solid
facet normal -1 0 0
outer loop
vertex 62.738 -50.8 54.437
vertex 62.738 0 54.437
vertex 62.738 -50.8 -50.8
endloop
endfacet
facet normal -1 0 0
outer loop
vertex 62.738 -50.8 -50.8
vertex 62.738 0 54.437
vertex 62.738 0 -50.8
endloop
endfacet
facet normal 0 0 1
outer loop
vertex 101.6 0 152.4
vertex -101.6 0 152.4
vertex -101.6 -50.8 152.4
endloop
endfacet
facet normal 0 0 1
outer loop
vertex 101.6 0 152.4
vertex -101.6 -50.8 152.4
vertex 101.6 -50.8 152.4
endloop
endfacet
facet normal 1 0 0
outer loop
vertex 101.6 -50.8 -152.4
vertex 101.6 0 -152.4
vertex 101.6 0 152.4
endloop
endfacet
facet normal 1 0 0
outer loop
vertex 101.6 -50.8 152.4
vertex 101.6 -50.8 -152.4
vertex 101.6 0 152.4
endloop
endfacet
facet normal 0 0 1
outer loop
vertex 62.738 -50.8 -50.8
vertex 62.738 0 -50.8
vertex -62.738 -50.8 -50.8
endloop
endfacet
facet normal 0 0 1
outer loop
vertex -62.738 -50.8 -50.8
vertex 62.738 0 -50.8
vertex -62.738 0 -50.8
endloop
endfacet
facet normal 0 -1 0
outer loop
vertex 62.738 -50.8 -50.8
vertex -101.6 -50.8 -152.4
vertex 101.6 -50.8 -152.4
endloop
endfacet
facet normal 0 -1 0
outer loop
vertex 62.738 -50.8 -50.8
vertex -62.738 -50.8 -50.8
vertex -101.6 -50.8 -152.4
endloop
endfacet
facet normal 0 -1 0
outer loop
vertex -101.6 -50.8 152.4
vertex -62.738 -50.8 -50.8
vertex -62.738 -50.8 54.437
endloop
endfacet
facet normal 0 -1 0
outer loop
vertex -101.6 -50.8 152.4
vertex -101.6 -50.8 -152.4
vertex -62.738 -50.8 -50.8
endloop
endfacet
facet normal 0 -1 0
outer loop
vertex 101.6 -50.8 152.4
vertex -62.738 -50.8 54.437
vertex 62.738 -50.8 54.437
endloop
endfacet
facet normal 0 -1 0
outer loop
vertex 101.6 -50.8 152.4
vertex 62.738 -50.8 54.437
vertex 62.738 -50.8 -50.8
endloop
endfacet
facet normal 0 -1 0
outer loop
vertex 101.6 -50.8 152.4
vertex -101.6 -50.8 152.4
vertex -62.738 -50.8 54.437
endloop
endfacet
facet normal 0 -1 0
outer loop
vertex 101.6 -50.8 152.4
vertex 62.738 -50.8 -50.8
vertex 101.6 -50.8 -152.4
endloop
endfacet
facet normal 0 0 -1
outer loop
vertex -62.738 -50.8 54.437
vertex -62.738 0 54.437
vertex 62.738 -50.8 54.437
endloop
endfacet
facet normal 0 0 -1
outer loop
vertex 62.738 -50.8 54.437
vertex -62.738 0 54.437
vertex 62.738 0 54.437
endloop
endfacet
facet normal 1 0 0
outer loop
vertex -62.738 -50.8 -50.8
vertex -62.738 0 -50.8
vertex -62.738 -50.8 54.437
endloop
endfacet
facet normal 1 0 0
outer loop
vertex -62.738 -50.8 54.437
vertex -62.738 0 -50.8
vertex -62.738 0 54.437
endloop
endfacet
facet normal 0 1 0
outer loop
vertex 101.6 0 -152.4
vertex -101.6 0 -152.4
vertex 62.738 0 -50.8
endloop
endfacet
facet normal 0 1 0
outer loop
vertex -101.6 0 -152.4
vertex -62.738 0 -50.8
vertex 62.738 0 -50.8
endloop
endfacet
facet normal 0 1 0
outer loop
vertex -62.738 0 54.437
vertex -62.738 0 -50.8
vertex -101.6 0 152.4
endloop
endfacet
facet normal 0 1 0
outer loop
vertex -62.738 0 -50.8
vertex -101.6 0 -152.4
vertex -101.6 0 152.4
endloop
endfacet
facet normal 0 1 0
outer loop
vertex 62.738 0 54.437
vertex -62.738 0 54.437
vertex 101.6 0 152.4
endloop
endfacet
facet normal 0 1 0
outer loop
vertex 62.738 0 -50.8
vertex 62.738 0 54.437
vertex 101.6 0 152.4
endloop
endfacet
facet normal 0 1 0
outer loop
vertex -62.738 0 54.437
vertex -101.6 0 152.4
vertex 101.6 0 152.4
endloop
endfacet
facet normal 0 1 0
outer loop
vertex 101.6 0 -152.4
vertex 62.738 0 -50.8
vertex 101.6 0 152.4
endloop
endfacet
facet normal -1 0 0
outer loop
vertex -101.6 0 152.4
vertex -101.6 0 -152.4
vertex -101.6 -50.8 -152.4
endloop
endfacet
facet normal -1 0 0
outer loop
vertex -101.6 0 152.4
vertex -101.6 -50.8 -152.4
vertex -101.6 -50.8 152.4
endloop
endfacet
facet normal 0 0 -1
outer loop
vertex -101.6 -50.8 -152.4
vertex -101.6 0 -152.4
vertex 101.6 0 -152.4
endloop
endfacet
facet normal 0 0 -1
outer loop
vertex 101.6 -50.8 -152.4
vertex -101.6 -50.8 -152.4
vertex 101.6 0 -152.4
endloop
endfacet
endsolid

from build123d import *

# Parameters (mm, degrees)
F0_W     = 203.2
F0_H     = 304.8
F0_W_2   = 125.476
F0_H_2   = 59.863002
F0_W_3   = 77.724
F0_H_3   = 58.935668
F1_DEPTH = 50.8


with BuildPart() as f1:
    # F0 (on Front) → F1 (new body)
    with BuildSketch(Plane.XZ):
        Rectangle(F0_W, F0_H)
        Polygon((-38.862, -109.735668), (-38.862, -50.8), (-62.738, -50.8), (-62.738, 54.436998), (-62.738, 114.3), (62.738, 114.3), (62.738, 54.436998), (62.738, -50.8), (38.862, -50.8), (38.862, -109.735668), align=None, mode=Mode.SUBTRACT)
        with Locations((0, 84.368499)):
            Rectangle(F0_W_2, F0_H_2)
        with Locations((0, -80.267834)):
            Rectangle(F0_W_3, F0_H_3)
    extrude(amount=F1_DEPTH)


solid = f1.part
